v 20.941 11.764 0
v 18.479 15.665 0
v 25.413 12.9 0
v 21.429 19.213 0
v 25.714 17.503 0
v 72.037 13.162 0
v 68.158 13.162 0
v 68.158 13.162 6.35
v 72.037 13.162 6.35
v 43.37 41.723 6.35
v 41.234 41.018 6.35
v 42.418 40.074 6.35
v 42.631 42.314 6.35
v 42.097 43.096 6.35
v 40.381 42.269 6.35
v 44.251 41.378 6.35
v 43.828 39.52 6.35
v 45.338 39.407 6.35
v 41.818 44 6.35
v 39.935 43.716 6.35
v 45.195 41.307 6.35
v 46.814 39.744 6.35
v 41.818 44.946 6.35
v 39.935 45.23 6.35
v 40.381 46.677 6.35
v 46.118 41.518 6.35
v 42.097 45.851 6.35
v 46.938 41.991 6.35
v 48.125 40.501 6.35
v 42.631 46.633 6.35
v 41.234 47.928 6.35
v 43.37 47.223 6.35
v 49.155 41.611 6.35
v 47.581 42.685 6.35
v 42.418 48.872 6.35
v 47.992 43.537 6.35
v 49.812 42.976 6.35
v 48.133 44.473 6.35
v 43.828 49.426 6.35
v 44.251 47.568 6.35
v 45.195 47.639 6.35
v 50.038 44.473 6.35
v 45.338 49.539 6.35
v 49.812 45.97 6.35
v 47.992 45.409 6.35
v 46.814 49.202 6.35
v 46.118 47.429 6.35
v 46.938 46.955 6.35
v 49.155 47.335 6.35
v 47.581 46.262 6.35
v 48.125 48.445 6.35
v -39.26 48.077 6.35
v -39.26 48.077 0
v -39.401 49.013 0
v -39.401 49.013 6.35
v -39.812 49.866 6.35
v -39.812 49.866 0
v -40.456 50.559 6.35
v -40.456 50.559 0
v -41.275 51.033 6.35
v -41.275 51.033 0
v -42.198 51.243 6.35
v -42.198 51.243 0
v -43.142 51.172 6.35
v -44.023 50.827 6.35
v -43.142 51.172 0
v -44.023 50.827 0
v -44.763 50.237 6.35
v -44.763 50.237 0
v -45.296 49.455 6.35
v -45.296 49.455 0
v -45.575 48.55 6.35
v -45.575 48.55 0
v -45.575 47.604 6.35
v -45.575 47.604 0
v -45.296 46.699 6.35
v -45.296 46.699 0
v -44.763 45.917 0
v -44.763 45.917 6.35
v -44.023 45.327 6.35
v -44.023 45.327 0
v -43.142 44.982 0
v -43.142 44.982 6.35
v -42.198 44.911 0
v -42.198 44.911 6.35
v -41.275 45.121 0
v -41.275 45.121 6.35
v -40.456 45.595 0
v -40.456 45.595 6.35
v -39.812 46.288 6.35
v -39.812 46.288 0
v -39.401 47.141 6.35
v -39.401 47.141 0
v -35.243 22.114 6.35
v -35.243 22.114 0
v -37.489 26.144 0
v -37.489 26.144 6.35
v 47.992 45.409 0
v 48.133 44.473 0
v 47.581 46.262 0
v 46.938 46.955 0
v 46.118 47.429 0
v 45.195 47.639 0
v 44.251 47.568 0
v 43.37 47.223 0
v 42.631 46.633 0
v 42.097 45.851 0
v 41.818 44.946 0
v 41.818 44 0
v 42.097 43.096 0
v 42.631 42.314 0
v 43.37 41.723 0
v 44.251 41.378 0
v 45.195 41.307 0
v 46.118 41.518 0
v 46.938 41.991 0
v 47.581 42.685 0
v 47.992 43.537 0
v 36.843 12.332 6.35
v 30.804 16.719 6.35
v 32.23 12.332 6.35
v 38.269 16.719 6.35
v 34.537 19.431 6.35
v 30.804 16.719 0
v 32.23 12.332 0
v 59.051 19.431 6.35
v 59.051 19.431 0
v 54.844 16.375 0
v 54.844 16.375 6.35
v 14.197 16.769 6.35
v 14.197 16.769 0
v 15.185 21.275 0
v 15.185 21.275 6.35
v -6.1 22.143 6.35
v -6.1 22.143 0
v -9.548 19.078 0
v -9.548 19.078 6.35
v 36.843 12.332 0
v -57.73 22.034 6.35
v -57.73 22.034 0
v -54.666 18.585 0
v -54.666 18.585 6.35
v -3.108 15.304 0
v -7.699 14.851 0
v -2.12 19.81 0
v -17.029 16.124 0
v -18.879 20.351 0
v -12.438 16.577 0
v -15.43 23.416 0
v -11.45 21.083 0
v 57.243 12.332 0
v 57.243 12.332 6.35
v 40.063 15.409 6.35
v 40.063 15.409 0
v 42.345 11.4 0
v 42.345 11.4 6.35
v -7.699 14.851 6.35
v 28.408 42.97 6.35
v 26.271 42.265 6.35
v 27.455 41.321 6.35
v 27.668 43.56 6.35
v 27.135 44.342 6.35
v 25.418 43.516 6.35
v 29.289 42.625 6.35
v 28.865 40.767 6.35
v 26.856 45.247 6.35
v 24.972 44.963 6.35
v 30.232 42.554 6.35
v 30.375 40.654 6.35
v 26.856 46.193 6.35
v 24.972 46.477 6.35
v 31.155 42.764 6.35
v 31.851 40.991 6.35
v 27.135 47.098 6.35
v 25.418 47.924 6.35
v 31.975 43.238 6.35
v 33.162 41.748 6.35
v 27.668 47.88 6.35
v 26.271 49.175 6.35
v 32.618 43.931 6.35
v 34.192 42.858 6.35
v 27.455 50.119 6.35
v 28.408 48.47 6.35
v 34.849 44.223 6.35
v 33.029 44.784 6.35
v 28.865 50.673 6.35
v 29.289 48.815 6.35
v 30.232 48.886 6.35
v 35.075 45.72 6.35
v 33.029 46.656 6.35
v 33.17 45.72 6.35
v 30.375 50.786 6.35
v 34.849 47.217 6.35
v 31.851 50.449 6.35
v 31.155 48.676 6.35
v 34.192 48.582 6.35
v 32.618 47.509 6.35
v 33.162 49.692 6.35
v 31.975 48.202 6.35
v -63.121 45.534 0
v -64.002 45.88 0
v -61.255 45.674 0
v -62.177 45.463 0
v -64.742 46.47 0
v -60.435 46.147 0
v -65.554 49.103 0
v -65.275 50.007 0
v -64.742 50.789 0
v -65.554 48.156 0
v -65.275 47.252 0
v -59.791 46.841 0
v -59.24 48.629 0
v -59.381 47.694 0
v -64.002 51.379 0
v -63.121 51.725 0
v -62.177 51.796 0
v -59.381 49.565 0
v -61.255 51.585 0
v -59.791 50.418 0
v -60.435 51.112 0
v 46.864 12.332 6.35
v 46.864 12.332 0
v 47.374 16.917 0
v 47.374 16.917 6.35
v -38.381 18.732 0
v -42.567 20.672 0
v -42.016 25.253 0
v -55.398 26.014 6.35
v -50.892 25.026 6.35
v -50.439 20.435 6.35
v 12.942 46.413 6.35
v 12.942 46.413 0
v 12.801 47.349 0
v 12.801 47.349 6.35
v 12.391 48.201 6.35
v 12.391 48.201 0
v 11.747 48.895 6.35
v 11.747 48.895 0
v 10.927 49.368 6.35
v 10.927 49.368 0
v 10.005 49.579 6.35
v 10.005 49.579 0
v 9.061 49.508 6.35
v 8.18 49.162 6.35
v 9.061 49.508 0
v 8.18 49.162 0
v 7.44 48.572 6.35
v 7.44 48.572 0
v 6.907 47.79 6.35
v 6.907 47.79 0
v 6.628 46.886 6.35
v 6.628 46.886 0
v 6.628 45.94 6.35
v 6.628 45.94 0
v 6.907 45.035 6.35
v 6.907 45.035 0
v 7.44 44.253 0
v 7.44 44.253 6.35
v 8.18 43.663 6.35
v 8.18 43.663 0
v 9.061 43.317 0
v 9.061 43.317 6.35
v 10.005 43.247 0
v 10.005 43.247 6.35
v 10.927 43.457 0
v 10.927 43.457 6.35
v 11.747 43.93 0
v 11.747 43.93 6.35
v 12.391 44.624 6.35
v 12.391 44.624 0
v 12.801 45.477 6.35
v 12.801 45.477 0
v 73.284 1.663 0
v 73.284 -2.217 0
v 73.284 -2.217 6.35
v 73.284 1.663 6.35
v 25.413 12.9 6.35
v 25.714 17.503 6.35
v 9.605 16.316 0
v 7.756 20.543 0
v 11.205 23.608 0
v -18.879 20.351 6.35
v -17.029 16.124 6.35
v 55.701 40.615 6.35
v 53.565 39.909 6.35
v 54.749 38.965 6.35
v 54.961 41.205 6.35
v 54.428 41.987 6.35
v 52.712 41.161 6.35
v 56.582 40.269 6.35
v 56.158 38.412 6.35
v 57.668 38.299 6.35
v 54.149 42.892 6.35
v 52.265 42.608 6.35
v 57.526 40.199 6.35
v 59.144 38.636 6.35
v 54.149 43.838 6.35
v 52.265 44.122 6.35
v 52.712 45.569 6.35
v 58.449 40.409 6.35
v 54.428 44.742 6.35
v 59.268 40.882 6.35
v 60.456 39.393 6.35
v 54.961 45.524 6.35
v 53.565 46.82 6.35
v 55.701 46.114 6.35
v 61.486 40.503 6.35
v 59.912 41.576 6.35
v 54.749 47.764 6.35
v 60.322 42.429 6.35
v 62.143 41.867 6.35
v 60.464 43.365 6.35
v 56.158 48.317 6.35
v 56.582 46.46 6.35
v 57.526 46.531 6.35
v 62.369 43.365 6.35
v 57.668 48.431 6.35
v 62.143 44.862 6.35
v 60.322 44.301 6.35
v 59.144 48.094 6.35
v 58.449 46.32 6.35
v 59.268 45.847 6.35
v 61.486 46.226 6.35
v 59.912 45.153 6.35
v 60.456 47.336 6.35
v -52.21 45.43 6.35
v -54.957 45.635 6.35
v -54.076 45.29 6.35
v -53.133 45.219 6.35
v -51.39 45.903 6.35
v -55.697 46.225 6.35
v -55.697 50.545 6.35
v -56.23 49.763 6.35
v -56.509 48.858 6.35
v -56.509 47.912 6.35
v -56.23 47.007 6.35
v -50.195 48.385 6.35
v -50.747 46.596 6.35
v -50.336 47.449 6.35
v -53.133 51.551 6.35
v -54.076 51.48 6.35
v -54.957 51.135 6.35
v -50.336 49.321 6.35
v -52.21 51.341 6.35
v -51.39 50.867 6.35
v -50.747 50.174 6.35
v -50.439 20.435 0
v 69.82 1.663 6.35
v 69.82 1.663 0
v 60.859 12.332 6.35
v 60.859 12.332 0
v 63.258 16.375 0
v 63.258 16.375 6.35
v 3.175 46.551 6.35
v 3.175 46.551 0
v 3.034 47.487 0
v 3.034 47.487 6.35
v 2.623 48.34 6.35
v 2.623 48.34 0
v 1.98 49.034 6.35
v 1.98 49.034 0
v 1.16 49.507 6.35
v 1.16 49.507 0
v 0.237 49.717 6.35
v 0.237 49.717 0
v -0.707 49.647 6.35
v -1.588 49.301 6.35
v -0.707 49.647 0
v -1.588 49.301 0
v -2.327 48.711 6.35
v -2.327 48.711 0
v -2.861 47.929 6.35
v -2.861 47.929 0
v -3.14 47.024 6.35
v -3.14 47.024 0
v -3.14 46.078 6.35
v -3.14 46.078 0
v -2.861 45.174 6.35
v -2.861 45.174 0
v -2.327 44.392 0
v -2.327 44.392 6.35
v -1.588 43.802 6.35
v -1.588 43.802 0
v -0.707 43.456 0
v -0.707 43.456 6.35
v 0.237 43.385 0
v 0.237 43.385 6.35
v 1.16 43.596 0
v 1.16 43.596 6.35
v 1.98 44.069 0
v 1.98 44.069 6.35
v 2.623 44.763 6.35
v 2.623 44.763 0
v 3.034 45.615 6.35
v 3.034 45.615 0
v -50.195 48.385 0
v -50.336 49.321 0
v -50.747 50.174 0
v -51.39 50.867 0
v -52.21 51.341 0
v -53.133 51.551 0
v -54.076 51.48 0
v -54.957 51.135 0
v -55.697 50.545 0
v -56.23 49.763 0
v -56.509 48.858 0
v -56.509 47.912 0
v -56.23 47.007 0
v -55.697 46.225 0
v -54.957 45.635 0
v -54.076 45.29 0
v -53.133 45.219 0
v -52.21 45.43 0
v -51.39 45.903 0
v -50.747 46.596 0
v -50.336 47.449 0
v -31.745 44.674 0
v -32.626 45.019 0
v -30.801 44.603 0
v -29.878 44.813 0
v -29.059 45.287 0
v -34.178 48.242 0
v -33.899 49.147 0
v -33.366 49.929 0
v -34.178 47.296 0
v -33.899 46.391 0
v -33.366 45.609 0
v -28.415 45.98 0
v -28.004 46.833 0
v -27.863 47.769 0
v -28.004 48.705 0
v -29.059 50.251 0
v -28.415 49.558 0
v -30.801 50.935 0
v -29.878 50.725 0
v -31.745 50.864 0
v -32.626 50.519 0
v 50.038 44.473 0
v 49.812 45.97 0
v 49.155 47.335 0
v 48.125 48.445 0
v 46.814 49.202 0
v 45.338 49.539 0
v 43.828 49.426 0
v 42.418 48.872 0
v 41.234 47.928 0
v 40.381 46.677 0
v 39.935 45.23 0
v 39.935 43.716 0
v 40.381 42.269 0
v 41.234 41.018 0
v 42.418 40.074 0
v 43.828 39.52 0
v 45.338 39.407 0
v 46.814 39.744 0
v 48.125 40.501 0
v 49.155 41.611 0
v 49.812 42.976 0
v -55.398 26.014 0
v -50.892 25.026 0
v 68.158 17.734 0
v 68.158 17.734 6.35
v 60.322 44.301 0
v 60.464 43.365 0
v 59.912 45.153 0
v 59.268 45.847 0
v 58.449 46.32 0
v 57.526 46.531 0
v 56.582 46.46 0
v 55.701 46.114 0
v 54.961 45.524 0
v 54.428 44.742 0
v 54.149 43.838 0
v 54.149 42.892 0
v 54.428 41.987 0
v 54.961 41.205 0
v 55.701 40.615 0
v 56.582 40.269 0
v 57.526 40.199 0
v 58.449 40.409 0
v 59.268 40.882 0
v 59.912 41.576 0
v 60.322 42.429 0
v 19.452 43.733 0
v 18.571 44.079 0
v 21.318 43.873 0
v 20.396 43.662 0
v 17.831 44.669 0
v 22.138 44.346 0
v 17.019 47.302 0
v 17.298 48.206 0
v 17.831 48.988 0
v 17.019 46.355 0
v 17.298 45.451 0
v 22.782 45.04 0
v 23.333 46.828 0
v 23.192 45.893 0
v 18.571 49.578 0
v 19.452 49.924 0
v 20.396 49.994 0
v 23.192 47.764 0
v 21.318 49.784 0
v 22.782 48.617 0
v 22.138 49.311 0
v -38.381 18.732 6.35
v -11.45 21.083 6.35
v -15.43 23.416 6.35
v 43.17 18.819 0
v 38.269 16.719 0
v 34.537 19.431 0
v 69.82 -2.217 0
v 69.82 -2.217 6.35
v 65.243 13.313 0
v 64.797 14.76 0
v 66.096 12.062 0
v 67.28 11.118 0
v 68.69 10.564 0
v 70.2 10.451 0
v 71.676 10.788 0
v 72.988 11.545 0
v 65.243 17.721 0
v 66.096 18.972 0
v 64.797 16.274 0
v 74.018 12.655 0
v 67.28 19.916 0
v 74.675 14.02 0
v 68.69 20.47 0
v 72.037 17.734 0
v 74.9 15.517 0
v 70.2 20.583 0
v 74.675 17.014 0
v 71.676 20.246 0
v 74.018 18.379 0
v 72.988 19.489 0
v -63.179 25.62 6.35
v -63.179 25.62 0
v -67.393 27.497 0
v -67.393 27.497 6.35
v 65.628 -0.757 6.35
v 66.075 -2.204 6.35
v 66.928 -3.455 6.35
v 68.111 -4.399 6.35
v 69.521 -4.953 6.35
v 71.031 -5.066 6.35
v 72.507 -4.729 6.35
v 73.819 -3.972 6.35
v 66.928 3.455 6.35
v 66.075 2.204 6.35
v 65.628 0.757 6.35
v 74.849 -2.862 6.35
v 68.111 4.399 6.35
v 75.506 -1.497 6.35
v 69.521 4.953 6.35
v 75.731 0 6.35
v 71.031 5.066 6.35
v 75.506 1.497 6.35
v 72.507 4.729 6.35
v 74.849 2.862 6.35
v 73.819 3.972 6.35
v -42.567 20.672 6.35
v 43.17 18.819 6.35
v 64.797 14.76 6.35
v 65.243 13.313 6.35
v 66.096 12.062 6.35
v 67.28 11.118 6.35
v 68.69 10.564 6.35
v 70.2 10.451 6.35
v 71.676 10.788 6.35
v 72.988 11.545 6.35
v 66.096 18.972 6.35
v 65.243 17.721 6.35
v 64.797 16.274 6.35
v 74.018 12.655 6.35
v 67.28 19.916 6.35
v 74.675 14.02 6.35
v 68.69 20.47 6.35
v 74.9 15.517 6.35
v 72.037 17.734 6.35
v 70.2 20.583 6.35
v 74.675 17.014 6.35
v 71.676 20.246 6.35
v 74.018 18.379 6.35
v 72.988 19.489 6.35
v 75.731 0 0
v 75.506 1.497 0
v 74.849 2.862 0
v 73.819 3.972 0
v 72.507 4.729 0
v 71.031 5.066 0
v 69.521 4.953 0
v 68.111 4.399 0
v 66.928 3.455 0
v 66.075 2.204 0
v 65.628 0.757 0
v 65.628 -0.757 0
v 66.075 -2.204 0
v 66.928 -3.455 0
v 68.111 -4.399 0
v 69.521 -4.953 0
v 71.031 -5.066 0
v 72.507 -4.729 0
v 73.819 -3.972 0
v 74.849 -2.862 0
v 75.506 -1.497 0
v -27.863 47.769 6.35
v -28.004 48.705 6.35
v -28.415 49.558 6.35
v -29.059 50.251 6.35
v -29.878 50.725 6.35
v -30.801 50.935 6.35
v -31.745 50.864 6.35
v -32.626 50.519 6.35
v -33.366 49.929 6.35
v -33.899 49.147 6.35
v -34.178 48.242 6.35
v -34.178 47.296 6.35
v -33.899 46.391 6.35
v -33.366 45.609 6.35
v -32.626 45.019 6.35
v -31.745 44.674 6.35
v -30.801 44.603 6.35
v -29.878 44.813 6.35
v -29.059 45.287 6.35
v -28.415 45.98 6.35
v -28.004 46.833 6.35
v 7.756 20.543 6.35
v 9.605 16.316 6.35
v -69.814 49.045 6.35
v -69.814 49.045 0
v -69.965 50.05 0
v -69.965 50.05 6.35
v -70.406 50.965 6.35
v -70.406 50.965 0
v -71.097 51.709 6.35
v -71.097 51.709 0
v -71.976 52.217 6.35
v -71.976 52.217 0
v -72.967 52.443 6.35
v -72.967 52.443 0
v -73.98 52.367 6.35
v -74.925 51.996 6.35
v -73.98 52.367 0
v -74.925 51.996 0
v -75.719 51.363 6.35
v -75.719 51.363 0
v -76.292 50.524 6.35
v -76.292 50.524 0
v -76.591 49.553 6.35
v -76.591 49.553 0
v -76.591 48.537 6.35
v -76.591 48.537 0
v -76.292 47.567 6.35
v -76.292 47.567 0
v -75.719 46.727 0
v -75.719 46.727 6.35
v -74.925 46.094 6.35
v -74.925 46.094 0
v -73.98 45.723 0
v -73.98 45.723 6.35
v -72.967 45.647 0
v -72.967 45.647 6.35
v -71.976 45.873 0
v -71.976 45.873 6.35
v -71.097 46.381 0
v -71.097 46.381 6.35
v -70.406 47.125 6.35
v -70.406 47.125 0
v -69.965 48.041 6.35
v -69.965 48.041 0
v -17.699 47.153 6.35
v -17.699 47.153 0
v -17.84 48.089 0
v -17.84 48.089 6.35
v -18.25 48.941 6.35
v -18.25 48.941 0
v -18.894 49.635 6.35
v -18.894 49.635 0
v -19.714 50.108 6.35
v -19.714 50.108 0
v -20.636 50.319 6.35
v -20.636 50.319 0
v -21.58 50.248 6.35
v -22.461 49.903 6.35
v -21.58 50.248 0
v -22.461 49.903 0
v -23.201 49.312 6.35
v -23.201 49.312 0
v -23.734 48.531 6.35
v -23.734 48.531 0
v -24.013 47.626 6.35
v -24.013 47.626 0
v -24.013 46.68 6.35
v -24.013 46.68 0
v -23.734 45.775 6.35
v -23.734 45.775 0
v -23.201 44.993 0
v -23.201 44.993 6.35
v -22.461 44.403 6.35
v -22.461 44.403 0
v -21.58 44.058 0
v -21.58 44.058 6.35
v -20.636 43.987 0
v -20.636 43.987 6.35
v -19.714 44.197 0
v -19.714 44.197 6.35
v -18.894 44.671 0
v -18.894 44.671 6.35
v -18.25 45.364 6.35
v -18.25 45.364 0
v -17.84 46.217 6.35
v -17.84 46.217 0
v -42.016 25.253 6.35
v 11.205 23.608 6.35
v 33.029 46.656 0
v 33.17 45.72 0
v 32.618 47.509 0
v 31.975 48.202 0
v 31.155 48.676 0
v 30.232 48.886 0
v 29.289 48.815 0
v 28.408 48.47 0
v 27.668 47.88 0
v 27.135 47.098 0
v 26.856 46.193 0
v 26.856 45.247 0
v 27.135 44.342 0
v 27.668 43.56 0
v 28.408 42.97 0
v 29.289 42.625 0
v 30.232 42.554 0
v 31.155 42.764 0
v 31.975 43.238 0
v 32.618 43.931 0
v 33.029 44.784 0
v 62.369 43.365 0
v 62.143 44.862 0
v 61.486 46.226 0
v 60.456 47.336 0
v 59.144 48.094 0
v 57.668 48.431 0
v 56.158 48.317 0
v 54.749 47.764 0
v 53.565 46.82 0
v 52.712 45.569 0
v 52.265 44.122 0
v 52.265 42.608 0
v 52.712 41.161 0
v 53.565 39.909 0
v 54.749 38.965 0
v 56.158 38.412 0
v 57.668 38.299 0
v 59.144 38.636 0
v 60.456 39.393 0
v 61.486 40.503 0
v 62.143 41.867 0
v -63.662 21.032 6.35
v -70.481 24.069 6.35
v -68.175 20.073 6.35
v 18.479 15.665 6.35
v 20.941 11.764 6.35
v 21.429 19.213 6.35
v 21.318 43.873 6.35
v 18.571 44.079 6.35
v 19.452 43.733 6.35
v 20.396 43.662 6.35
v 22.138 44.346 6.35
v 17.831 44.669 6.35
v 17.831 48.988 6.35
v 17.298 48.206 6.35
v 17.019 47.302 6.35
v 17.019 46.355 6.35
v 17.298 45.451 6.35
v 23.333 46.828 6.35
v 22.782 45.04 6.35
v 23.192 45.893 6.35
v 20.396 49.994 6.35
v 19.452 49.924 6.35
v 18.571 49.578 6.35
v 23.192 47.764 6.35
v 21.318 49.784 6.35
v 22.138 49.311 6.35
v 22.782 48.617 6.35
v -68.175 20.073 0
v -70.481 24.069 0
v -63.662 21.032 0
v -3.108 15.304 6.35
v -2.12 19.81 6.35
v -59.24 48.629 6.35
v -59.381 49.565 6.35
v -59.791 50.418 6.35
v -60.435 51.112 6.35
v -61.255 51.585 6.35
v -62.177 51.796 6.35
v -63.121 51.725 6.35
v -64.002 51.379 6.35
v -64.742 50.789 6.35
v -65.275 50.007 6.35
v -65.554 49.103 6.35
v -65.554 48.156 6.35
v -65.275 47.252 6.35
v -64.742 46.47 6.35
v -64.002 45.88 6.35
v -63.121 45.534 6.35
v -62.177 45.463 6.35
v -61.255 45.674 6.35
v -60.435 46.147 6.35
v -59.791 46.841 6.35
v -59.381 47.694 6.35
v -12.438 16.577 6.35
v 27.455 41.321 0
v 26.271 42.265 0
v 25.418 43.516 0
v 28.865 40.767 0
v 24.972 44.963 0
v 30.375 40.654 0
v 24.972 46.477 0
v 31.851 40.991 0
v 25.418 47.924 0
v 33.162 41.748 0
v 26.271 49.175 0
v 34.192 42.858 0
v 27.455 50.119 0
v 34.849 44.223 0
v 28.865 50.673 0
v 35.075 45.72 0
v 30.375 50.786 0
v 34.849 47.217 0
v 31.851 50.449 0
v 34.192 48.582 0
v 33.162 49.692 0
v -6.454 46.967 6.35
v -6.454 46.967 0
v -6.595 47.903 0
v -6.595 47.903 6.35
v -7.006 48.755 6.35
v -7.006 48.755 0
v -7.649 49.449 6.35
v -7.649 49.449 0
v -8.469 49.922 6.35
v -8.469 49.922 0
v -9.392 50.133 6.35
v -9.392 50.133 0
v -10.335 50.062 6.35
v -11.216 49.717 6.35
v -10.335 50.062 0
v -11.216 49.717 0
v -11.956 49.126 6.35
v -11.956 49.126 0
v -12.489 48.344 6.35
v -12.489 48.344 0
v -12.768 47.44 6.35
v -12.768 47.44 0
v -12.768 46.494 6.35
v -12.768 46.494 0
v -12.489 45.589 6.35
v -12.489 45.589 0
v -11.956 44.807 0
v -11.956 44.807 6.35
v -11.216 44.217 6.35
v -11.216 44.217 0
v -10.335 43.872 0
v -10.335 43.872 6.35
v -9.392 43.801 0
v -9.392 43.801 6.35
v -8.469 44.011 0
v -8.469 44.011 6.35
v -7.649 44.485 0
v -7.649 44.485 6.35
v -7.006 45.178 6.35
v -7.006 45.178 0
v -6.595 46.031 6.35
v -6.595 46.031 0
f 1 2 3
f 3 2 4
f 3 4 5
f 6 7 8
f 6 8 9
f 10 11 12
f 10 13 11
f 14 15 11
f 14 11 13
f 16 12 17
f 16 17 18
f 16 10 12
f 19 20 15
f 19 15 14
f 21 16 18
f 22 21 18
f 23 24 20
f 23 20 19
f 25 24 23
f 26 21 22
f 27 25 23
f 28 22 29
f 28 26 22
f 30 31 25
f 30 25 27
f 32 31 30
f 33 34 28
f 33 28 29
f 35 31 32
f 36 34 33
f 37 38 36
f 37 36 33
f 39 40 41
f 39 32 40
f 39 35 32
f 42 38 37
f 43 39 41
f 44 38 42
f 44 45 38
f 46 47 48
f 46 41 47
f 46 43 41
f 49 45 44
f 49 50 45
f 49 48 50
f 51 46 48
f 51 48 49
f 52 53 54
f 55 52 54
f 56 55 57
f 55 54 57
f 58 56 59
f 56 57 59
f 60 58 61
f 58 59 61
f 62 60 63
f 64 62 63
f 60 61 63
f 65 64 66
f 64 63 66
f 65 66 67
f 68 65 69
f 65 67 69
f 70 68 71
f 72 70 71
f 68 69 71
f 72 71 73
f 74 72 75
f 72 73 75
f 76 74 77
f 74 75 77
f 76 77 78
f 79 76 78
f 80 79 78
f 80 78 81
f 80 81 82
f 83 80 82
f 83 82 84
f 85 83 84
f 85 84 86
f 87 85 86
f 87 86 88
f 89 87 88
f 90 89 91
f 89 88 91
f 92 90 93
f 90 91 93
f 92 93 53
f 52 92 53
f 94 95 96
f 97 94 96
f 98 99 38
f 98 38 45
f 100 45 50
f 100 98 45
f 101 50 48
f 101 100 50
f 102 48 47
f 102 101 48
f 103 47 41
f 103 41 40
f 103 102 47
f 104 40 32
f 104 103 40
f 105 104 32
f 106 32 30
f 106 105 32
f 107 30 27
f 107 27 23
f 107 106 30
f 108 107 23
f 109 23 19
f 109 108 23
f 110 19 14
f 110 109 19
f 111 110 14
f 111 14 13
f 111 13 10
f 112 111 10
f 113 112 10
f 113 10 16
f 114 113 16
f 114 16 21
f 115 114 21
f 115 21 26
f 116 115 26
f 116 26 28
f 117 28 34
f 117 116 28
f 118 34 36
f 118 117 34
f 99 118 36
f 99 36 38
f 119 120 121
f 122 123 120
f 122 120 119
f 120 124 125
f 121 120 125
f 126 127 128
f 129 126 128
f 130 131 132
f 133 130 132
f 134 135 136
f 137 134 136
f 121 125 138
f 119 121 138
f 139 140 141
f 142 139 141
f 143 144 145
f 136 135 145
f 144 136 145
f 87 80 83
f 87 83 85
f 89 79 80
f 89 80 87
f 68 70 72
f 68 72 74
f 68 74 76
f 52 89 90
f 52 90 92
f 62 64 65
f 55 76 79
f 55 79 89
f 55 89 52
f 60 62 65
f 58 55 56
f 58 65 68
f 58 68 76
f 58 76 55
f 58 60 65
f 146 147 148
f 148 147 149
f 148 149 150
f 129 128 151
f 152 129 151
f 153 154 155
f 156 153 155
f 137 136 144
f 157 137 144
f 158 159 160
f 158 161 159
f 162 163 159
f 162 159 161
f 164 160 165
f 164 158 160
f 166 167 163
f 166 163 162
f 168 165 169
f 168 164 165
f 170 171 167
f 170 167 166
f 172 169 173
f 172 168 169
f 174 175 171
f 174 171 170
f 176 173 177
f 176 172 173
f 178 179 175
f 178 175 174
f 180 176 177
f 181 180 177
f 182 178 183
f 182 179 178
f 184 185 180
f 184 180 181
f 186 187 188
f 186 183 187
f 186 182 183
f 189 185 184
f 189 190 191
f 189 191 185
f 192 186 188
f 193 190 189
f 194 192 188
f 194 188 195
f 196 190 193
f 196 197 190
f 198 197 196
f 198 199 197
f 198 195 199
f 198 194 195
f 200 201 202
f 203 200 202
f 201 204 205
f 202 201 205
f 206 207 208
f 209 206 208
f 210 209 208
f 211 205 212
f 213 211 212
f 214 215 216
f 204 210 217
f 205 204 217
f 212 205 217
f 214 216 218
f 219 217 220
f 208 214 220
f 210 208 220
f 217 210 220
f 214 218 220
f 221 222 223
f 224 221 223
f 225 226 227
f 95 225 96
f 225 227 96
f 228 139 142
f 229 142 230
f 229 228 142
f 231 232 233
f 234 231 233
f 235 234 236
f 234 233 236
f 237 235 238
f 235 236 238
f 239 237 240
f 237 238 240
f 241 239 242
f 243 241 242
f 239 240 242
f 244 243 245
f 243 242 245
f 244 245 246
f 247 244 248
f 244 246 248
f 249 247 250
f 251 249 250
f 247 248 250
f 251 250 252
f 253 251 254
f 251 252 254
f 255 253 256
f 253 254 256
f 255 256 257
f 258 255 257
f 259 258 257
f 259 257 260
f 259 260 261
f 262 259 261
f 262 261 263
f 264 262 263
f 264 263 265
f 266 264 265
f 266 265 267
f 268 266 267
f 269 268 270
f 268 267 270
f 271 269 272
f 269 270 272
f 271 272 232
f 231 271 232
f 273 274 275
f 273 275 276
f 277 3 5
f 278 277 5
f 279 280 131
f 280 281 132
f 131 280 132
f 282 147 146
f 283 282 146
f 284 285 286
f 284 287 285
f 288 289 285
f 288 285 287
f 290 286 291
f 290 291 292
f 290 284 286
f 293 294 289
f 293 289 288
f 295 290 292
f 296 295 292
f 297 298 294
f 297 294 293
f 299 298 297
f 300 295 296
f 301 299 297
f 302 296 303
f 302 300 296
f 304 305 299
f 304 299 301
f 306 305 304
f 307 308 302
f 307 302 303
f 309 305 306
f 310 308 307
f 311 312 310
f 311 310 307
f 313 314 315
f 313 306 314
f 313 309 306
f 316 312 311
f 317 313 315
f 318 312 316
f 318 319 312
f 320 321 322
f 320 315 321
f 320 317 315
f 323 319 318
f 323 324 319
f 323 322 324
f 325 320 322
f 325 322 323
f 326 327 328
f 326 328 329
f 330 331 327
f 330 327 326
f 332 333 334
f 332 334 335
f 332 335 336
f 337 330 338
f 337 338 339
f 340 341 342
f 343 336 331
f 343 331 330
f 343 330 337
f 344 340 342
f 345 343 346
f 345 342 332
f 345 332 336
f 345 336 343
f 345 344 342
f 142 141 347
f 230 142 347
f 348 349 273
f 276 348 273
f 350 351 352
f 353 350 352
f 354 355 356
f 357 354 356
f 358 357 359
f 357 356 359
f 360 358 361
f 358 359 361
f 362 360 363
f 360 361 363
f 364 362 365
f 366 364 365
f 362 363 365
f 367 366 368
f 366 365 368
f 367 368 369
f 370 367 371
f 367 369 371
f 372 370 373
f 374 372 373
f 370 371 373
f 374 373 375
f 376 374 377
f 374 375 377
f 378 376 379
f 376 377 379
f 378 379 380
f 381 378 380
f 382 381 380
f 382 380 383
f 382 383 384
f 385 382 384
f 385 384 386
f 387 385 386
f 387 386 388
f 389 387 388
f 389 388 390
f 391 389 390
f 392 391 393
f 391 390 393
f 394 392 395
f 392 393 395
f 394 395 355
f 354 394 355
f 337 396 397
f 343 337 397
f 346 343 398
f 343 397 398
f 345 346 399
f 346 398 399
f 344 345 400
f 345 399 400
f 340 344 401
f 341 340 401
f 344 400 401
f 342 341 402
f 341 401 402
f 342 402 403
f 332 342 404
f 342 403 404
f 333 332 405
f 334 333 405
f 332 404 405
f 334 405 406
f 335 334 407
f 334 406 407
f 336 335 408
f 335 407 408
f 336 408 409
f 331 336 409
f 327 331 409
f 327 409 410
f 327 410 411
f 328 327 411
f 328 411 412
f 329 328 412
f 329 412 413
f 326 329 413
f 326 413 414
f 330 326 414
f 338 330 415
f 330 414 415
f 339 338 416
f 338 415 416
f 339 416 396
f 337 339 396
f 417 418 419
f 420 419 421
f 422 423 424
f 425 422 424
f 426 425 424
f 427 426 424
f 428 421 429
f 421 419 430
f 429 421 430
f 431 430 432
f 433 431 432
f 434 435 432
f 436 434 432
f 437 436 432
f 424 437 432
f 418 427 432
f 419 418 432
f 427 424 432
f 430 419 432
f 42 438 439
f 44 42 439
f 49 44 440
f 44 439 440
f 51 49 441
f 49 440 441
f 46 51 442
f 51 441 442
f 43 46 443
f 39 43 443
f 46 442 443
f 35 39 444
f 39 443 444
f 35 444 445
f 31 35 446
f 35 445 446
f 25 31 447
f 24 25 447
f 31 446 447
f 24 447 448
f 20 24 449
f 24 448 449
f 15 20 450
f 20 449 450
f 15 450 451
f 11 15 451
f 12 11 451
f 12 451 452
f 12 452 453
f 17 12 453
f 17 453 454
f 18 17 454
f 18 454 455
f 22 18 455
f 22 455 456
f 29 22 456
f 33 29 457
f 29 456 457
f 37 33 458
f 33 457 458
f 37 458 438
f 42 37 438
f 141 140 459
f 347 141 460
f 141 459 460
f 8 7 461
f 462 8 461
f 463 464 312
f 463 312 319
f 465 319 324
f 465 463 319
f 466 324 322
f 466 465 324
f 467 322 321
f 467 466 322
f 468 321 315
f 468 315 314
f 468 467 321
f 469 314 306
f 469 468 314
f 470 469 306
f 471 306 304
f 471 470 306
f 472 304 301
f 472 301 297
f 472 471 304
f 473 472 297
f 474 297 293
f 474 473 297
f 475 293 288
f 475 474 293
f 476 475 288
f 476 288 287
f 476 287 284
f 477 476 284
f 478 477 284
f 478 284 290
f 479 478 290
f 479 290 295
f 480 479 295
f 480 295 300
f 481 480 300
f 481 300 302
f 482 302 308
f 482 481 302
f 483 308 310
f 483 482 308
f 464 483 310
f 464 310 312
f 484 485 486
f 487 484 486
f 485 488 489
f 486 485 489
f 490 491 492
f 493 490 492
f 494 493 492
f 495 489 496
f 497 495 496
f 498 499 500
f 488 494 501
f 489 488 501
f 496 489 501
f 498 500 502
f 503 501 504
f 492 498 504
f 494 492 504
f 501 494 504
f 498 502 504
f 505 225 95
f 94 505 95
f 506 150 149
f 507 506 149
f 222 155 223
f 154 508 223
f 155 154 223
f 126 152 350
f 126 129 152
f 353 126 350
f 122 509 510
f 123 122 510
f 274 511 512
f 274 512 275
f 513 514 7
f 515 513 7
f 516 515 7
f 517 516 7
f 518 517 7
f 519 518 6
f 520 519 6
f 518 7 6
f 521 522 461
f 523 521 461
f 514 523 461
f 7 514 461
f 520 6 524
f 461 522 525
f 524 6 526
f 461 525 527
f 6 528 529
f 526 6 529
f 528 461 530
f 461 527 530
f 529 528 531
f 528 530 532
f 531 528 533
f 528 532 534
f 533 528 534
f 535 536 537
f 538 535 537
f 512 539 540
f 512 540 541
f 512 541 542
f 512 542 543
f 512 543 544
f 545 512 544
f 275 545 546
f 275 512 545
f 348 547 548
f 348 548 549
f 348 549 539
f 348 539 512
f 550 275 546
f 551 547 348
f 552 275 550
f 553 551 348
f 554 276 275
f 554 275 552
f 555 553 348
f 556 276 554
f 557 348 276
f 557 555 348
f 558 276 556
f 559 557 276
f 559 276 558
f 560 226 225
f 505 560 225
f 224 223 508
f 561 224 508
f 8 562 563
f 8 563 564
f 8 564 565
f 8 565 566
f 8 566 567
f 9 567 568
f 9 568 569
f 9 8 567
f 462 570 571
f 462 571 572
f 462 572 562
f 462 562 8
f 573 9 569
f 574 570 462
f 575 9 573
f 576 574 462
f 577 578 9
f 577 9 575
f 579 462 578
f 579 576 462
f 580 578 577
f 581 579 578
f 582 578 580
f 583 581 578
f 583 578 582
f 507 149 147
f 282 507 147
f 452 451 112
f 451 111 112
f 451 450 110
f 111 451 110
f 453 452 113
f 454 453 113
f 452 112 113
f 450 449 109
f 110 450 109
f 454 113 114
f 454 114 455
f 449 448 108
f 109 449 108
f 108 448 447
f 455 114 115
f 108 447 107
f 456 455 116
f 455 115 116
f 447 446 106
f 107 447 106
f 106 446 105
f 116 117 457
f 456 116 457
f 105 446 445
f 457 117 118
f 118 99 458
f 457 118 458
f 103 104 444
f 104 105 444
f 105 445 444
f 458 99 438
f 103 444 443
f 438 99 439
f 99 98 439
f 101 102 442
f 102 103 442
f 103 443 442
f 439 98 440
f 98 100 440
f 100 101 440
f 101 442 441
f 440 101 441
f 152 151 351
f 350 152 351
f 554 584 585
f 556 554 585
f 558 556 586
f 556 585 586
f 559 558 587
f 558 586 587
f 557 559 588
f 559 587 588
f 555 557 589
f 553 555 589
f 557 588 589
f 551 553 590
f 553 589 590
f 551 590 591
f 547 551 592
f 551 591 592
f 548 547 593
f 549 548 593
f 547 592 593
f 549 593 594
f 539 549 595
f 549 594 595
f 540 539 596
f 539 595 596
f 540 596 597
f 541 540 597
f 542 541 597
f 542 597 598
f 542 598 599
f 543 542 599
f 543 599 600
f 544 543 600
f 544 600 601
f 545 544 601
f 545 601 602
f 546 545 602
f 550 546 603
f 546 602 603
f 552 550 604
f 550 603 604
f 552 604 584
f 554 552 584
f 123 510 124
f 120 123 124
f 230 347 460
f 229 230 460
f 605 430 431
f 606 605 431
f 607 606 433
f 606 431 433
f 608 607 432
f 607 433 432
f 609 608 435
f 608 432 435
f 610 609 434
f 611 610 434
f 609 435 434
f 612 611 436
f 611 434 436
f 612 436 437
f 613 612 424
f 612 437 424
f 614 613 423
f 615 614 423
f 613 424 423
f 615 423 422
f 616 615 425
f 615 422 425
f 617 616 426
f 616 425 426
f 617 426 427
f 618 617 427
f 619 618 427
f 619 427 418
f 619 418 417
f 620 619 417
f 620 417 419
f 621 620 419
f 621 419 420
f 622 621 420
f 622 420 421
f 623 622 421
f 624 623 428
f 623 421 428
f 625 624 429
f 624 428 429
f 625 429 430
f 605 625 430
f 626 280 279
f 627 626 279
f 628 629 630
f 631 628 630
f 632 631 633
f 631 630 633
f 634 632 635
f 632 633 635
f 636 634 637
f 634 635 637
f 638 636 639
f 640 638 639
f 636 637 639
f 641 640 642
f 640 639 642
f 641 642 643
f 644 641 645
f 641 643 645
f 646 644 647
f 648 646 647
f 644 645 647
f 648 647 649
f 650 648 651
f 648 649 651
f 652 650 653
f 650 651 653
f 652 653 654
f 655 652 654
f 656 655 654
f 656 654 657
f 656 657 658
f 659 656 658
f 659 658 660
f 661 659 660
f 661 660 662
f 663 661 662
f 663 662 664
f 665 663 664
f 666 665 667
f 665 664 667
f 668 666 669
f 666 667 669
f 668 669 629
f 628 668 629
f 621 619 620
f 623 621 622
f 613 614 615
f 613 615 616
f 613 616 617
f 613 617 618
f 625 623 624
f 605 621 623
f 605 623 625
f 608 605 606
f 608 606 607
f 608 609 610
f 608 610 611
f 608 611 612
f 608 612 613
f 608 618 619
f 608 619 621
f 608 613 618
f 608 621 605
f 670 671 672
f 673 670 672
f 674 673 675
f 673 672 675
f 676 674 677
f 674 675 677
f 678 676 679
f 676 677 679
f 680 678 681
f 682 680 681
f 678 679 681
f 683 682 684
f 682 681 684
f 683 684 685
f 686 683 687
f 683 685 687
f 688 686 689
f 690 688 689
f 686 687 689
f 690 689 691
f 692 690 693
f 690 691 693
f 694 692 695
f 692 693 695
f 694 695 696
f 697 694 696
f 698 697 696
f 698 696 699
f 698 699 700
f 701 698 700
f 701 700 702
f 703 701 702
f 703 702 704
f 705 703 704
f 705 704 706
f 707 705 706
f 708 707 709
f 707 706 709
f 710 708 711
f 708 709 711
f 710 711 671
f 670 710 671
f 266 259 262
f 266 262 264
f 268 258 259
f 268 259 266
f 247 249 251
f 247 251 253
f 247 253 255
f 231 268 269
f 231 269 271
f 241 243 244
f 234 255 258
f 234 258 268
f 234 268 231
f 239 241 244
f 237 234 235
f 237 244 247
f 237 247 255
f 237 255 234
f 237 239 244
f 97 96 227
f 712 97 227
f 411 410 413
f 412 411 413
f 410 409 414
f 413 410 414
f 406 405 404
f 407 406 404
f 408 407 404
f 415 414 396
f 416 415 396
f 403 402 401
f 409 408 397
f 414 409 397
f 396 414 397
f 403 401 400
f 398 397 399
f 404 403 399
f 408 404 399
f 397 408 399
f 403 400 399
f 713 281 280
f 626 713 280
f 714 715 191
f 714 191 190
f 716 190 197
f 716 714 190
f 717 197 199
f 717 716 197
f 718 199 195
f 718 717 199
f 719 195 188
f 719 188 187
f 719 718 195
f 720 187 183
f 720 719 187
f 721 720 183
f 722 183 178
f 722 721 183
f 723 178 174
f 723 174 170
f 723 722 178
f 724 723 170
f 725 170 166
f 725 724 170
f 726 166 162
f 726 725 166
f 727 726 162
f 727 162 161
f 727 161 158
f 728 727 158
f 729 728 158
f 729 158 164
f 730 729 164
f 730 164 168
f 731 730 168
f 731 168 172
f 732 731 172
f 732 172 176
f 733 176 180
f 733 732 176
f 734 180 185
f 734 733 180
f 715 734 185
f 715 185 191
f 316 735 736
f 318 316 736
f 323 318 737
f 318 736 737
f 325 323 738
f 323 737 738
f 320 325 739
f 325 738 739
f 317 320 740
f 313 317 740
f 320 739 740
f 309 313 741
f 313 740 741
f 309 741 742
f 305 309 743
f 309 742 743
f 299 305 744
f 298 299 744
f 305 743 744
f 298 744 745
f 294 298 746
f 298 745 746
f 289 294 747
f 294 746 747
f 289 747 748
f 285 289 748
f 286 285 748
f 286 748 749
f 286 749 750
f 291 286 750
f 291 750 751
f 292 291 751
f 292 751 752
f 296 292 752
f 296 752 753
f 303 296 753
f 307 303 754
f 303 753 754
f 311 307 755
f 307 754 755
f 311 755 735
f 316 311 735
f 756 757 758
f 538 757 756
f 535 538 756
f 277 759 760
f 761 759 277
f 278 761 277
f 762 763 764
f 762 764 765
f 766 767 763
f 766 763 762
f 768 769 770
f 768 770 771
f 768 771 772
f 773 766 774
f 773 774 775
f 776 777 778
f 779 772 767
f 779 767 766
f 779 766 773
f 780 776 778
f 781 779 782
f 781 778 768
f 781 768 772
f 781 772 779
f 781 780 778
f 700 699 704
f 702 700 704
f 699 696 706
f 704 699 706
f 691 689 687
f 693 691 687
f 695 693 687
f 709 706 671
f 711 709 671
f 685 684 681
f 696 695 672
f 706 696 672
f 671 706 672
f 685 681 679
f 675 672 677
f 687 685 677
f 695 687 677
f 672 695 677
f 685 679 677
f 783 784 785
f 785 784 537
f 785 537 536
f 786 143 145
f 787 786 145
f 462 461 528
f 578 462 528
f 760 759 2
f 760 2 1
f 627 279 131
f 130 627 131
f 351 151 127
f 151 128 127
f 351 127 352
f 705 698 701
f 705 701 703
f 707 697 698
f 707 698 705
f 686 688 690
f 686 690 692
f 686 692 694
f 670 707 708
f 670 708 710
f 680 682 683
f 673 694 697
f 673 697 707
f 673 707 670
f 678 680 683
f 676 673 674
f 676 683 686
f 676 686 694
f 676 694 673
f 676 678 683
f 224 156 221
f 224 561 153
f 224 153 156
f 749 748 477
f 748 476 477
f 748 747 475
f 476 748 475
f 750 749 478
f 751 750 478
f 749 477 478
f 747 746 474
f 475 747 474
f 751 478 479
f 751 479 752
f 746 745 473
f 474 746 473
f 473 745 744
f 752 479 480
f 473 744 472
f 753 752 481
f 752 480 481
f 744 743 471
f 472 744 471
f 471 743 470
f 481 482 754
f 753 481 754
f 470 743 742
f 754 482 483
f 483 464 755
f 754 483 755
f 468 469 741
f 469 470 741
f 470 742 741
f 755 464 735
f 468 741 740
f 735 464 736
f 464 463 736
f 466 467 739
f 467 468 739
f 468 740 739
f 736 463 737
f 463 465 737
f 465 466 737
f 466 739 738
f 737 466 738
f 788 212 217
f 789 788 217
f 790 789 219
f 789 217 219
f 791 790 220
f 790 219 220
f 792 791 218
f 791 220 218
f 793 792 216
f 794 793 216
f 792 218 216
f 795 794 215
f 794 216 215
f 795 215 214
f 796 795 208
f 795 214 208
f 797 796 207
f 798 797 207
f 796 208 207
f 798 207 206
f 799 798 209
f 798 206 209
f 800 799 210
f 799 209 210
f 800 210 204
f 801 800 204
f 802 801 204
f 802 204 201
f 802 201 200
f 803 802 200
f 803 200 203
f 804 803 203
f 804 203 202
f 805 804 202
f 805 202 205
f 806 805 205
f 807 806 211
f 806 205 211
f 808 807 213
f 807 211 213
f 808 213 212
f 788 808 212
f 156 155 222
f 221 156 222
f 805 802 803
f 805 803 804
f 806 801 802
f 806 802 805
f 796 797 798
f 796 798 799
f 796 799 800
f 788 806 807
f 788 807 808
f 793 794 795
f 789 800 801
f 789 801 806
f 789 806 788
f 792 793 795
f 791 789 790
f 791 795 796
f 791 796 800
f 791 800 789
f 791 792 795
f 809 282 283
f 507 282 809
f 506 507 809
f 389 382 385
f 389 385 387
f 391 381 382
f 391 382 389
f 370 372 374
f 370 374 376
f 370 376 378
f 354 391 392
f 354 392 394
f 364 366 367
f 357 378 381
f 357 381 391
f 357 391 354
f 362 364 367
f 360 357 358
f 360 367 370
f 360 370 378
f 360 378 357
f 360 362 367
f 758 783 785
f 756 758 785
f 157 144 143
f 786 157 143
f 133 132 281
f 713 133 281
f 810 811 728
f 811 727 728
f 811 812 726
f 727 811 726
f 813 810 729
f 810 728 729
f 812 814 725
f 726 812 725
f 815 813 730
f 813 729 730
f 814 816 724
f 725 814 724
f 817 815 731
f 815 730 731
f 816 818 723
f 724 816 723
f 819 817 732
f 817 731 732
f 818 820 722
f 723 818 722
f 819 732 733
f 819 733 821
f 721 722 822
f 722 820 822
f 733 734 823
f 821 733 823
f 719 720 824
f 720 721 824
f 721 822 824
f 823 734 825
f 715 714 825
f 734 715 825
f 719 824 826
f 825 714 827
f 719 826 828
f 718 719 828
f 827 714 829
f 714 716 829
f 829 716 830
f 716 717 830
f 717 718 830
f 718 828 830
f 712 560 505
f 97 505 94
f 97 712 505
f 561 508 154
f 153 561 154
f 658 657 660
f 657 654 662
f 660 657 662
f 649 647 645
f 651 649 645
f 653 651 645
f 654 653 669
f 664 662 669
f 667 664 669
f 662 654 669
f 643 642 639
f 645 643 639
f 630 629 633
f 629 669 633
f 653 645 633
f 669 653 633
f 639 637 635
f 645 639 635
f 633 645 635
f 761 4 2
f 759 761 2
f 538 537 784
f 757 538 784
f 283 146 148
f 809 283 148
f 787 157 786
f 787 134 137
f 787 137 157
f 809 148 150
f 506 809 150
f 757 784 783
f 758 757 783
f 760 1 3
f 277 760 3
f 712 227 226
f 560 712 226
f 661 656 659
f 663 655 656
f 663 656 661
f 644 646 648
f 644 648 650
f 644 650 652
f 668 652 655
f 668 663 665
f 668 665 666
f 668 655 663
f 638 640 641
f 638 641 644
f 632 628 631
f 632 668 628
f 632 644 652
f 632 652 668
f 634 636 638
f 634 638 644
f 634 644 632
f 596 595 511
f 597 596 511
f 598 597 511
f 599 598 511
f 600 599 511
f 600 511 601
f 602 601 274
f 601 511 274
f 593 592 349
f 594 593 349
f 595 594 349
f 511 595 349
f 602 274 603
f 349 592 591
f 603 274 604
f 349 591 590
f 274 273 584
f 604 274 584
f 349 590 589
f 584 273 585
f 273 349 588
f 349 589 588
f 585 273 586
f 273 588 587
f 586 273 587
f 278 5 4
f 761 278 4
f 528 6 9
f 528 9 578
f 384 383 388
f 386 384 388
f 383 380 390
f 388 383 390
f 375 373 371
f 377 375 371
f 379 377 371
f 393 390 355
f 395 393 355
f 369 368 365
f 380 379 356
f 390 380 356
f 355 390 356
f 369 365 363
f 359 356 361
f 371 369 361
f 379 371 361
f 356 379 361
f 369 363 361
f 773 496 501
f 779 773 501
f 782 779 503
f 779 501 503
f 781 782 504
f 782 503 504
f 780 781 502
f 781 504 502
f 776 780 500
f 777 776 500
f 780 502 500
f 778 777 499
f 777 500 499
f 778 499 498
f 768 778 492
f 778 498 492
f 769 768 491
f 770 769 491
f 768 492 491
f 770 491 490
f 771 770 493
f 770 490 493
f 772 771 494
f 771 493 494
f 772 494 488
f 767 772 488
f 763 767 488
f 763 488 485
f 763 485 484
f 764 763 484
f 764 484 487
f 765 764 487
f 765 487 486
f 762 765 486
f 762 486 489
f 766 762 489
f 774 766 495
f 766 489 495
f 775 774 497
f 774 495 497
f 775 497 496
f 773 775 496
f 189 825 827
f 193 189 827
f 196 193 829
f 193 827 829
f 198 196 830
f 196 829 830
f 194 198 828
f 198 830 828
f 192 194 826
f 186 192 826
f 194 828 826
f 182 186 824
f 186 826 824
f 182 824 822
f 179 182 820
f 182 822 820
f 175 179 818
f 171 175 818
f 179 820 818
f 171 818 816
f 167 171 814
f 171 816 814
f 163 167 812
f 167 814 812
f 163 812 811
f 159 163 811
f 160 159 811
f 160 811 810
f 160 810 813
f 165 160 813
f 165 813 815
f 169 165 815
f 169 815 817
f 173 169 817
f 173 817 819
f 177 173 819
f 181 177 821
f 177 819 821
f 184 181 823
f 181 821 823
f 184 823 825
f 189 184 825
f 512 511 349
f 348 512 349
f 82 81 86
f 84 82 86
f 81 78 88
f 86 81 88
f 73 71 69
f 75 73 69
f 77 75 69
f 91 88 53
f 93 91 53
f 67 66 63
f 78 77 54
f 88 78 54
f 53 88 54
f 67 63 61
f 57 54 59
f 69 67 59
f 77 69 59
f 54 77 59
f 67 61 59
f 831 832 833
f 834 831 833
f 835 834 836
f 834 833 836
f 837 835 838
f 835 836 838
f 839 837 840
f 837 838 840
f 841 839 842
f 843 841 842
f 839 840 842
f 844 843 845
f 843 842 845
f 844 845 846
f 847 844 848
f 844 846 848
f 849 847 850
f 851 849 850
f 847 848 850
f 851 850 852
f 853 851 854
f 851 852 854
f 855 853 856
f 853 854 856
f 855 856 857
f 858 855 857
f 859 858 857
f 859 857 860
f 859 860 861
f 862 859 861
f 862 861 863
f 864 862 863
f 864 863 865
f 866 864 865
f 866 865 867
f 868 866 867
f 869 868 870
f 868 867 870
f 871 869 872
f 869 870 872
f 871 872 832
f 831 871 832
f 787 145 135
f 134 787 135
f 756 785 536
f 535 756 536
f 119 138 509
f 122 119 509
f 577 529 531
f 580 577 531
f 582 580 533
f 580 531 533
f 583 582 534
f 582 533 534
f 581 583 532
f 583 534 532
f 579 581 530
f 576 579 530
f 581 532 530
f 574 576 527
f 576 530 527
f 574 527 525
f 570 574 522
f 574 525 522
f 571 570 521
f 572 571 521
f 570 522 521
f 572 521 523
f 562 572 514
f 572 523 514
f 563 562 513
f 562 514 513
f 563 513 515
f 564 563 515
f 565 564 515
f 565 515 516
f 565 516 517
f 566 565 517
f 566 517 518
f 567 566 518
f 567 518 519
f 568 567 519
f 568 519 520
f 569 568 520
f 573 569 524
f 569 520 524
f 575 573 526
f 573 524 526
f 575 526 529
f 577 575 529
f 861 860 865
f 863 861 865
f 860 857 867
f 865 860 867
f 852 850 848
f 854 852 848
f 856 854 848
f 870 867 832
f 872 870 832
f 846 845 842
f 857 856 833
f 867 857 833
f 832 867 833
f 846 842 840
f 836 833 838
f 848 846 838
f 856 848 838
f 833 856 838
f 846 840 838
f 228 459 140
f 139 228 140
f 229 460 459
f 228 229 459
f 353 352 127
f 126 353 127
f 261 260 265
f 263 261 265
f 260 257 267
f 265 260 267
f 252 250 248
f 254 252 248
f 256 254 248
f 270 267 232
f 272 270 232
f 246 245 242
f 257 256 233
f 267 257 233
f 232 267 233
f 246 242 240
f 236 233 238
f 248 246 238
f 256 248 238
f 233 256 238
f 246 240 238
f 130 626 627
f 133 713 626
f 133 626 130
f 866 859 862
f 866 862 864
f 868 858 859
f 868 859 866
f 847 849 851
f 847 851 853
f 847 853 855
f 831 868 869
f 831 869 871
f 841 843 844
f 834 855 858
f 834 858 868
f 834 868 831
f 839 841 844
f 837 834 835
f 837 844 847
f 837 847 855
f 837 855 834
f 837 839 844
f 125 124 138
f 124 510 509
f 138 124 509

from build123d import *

# Parameters (mm, degrees)
F0_R     = 3.175
F0_R_2   = 5.08
F0_R_3   = 3.407771
F0_W     = 3.879264
F0_H     = 4.572002
F0_W_2   = 3.463634
F0_H_2   = 3.879272
F1_DEPTH = 6.35


with BuildPart() as f1:
    # F0 (on Top) → F1 (new body)
    with BuildSketch(Plane.XY):
        with Locations((-53.369883, 48.38503)):
            Circle(F0_R)
        with Locations((-42.435167, 48.077005)):
            Circle(F0_R)
        with Locations((-31.038418, 47.768985)):
            Circle(F0_R)
        with Locations((-20.873752, 47.152949)):
            Circle(F0_R)
        with Locations((-62.414728, 48.629455)):
            Circle(F0_R)
        with Locations((-9.628909, 46.96691)):
            Circle(F0_R)
        with Locations((0, 46.551272)):
            Circle(F0_R)
        with Locations((9.767455, 46.412729)):
            Circle(F0_R)
        with Locations((20.158364, 46.828363)):
            Circle(F0_R)
        with Locations((29.995091, 45.720004)):
            Circle(F0_R_2)
        with Locations((29.995091, 45.720004)):
            Circle(F0_R, mode=Mode.SUBTRACT)
        with Locations((44.957999, 44.473089)):
            Circle(F0_R_2)
        with Locations((44.957999, 44.473089)):
            Circle(F0_R, mode=Mode.SUBTRACT)
        with Locations((57.28855, 43.36473)):
            Circle(F0_R_2)
        with Locations((57.28855, 43.36473)):
            Circle(F0_R, mode=Mode.SUBTRACT)
        Polygon((-68.175277, 20.073463), (-63.662324, 21.031615), (-63.179001, 25.619773), (-67.393244, 27.497259), (-70.481112, 24.069452), align=None)
        with Locations((-73.221274, 49.045093)):
            Circle(F0_R_3)
        Polygon((-54.665676, 18.585401), (-50.438943, 20.434596), (-50.8915, 25.025891), (-55.397928, 26.014272), (-57.730498, 22.03383), align=None)
        Polygon((-42.567015, 20.672106), (-38.381097, 18.73229), (-35.242702, 22.113898), (-37.488986, 26.143664), (-42.01566, 25.252587), align=None)
        Polygon((-17.029436, 16.124032), (-12.438141, 16.576589), (-11.44976, 21.083018), (-15.430202, 23.415587), (-18.878631, 20.350766), align=None)
        Polygon((-7.699202, 14.851433), (-3.107907, 15.303989), (-2.119526, 19.810418), (-6.099968, 22.142988), (-9.548397, 19.078166), align=None)
        Polygon((32.229875, 12.331741), (36.84342, 12.331741), (38.269084, 16.719483), (34.536648, 19.431257), (30.804212, 16.719483), align=None)
        Polygon((42.3453, 11.399708), (46.86372, 12.331741), (47.373572, 16.917027), (43.170259, 18.818857), (40.062616, 15.408966), align=None)
        Polygon((9.605324, 16.316232), (14.196619, 16.768789), (15.185, 21.275217), (11.204559, 23.607787), (7.756129, 20.542965), align=None)
        Polygon((20.941445, 11.763684), (25.412915, 12.899798), (25.714167, 17.503497), (21.42888, 19.212626), (18.479176, 15.665226), align=None)
        Polygon((57.24342, 12.331741), (60.858813, 12.331741), (63.258285, 16.37457), (59.051116, 19.431257), (54.843948, 16.37457), align=None)
        with Locations((69.82021, 15.51709)):
            Circle(F0_R_2)
        with Locations((70.097297, 15.447819)):
            Rectangle(F0_W, F0_H, mode=Mode.SUBTRACT)
        with Locations((70.651487, 0)):
            Circle(F0_R_2)
        with Locations((71.552027, -0.277091)):
            Rectangle(F0_W_2, F0_H_2, mode=Mode.SUBTRACT)
    extrude(amount=F1_DEPTH)


solid = f1.part
